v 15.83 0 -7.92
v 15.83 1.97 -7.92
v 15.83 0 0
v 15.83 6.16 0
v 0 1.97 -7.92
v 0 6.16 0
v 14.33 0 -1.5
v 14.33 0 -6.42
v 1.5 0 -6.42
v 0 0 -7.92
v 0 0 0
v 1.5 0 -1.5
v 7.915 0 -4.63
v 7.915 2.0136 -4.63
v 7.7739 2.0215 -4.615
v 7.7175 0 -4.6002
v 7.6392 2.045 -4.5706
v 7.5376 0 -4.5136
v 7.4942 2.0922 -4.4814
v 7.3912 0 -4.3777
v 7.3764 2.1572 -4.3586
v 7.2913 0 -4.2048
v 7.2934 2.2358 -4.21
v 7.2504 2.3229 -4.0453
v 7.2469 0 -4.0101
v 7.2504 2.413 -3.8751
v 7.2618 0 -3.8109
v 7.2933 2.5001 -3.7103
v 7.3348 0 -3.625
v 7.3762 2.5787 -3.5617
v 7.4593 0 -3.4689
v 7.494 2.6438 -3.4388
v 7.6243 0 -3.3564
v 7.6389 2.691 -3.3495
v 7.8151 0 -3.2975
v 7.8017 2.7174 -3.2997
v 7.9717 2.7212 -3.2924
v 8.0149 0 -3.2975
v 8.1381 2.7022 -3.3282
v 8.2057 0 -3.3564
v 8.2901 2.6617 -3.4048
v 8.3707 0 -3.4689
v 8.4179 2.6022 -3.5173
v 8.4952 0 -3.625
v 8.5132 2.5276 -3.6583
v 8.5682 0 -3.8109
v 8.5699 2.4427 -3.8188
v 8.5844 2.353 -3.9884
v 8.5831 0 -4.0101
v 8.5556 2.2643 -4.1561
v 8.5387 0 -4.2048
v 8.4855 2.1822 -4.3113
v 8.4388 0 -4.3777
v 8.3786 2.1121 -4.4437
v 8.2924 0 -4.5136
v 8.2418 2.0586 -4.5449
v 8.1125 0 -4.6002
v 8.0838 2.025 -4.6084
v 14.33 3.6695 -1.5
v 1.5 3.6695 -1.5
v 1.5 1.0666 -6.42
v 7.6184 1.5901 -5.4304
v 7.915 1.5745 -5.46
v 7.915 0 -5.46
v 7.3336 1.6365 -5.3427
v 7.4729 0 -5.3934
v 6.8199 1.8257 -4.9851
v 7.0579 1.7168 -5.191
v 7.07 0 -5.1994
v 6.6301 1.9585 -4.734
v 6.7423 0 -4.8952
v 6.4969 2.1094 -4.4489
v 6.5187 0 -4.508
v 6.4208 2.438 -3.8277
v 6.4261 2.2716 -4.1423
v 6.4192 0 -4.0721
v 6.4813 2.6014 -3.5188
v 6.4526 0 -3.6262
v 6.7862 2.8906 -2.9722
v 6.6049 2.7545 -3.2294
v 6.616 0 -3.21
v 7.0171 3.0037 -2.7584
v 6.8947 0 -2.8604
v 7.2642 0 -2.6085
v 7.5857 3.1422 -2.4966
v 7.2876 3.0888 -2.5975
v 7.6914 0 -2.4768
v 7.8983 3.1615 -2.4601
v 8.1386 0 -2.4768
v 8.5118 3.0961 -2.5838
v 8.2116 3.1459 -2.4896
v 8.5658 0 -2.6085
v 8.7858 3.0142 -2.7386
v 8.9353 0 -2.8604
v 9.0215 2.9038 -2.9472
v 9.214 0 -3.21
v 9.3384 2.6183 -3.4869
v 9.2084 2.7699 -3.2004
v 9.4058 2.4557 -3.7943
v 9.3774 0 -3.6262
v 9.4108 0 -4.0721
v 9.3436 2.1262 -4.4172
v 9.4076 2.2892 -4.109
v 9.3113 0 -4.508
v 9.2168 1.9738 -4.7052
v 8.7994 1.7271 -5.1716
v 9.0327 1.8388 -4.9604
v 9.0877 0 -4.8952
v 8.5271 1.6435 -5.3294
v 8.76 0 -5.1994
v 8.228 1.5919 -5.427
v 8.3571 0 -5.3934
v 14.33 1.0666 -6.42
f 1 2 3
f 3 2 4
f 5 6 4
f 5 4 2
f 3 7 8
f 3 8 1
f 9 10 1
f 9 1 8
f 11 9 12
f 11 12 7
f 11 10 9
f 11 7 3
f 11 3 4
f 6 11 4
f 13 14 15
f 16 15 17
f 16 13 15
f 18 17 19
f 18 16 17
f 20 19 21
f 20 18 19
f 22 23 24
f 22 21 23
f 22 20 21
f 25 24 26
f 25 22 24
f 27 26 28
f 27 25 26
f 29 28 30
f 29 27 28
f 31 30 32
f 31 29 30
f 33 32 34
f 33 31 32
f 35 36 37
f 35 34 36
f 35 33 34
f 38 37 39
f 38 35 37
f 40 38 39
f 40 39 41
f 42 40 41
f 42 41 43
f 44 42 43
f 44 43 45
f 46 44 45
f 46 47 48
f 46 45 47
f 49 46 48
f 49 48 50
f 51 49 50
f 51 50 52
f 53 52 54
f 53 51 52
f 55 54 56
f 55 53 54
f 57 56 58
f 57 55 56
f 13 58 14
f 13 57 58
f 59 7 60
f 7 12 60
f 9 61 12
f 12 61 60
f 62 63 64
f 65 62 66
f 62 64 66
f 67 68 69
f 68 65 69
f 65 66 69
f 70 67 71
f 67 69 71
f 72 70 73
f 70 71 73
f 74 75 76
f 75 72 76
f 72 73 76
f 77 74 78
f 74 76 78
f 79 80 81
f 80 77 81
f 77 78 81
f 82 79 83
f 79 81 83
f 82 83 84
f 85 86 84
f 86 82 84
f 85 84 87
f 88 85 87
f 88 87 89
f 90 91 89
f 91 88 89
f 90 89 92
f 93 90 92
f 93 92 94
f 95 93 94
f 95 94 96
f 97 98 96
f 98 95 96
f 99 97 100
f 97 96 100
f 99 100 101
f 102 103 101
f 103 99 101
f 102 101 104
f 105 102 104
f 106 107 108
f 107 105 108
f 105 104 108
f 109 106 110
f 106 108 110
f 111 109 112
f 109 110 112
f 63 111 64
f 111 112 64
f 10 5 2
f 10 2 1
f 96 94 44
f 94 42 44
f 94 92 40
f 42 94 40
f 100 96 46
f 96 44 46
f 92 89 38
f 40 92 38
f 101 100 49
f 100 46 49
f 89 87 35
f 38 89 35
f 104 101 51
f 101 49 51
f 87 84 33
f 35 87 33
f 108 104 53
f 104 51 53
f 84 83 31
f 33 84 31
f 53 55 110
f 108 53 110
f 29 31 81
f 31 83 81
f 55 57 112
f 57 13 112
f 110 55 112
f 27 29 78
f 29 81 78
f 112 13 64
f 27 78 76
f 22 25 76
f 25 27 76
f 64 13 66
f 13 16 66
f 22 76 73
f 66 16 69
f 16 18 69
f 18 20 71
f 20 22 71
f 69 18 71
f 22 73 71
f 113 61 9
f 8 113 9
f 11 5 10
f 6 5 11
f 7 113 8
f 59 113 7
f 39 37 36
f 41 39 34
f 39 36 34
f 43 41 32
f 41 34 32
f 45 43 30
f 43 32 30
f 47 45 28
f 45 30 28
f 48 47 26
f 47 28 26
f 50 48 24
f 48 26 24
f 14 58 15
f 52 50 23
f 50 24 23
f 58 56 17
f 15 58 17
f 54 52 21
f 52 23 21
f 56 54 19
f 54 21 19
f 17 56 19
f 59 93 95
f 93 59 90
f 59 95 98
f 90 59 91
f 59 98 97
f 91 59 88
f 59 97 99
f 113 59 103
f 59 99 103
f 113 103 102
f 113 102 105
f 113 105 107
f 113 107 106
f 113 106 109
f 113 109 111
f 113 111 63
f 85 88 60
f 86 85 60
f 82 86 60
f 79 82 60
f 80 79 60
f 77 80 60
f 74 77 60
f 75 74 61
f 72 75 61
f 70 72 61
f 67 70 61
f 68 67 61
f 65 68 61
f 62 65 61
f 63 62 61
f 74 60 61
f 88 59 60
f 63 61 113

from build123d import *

# Parameters (mm, degrees)
BOSS_EXTRUDE1_DEPTH = 15.83
SHELL1_T            = -1.5
BOSS_EXTRUDE3_REACH = 20.742
SKETCH2_R           = 1.5
SKETCH2_R_2         = 0.67


with BuildPart() as part:
    # Sketch1 → Boss-Extrude1 (new body)
    with BuildSketch(Plane(origin=(0, 0, 0), x_dir=(0, 0, -1), z_dir=(1, 0, 0))):
        Polygon((0, 0), (0, 6.16), (7.92, 1.97), (7.92, 0), align=None)
    extrude(amount=BOSS_EXTRUDE1_DEPTH)

    # Shell1
    shell1_openings = [part.faces().sort_by_distance(p)[0] for p in [
        (7.915, 0, -3.96),
    ]]
    offset(amount=SHELL1_T, openings=shell1_openings, kind=Kind.INTERSECTION)

    # Boss-Extrude3: up to this plane
    boss_extrude3_end = Plane(origin=(15.83, 0.644114575, -7.218553039), z_dir=(0, -0.8839236168124106, 0.46763130737929287))
    # Sketch2 → Boss-Extrude3 (add, up to the surface)
    with BuildSketch(Plane(origin=(0, 0, 0), x_dir=(1, 0, 0), z_dir=(0, 1, 0)), mode=Mode.PRIVATE) as boss_extrude3_sk1:
        with Locations(Location((7.915, 3.96, 0), (0, 0, 90))):
            Circle(SKETCH2_R)
        with Locations(Location((7.915, 3.96, 0), (0, 0, 90))):
            Circle(SKETCH2_R_2, mode=Mode.SUBTRACT)
    boss_extrude3_tool1 = split(extrude(boss_extrude3_sk1.sketch, amount=BOSS_EXTRUDE3_REACH, mode=Mode.PRIVATE), bisect_by=boss_extrude3_end, keep=Keep.BOTH, mode=Mode.PRIVATE)
    add(boss_extrude3_tool1.solids().sort_by_distance((7.915, 0, -2.502426))[0])


solid = part.part
